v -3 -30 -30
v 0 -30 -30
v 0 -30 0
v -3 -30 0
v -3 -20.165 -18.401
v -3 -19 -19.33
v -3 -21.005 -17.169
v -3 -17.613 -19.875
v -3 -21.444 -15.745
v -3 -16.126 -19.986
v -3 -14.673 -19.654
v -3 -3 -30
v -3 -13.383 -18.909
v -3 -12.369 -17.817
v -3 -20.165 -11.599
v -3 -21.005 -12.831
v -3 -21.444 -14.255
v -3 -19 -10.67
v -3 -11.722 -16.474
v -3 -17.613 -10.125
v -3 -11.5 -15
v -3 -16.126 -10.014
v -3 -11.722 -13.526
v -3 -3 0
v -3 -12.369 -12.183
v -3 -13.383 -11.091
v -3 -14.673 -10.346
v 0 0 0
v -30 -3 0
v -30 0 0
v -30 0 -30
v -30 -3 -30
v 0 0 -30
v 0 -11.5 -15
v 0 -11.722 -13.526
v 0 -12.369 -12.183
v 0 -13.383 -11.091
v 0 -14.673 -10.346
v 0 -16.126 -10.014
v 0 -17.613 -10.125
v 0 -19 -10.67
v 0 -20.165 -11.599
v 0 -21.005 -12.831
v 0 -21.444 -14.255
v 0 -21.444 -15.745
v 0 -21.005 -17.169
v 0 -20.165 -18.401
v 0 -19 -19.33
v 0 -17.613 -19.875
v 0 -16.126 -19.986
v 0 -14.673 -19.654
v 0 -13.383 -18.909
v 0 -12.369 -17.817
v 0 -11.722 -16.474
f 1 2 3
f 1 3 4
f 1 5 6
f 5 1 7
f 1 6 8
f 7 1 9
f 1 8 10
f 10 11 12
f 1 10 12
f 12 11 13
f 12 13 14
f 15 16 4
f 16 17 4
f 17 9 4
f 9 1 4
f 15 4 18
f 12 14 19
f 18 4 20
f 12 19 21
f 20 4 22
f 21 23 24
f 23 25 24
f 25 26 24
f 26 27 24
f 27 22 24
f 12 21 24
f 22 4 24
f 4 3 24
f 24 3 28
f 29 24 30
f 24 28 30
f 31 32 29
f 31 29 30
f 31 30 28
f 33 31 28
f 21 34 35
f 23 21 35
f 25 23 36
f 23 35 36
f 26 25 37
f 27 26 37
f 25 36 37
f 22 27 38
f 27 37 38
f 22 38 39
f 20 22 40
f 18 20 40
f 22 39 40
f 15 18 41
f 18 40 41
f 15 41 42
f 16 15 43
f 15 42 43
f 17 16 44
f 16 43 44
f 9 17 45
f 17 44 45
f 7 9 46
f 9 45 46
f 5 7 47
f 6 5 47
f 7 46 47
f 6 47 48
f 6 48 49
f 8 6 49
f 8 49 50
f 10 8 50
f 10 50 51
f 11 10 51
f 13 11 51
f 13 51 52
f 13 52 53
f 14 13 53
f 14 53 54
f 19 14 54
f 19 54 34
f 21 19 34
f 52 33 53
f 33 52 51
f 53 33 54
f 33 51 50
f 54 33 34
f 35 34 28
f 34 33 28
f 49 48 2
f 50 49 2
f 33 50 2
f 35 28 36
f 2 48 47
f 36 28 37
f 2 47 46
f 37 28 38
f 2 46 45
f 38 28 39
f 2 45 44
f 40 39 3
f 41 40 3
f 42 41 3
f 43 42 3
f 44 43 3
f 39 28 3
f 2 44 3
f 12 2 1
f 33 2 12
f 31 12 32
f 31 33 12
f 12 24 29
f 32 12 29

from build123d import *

# Parameters (mm, degrees)
BOSS_EXTRU_1_DEPTH = 30
D_GAGEMENT_M81_D   = 10
D_GAGEMENT_M82_D   = 10
D_GAGEMENT_M83_D   = 10
D_GAGEMENT_M84_D   = 10


with BuildPart() as part:
    # Esquisse1 → Boss.-Extru.1 (new body)
    with BuildSketch(Plane.XY):
        Polygon((0, 0), (0, -30), (-3, -30), (-3, -3), (-30, -3), (-30, 0), align=None)
    extrude(amount=-BOSS_EXTRU_1_DEPTH)

    # Dégagement M81 (through all)
    with Locations(Plane(origin=(-3, -21, 985), x_dir=(0, -1, 0), z_dir=(-1, 0, 0))):
        with Locations((-4.5, 1000), (-4.5, -1000)):
            Hole(D_GAGEMENT_M81_D / 2)

    # Dégagement M82 (through all)
    with Locations(Plane(origin=(33, -21, -1015), x_dir=(0, -1, 0), z_dir=(1, 0, 0))):
        with Locations((-4.5, 1000), (-4.5, -1000)):
            Hole(D_GAGEMENT_M82_D / 2)

    # Dégagement M83 (through all)
    with Locations(Plane(origin=(33, -21, 985), x_dir=(0, -1, 0), z_dir=(1, 0, 0))):
        with Locations((-4.5, 1000), (-4.5, -1000)):
            Hole(D_GAGEMENT_M83_D / 2)

    # Dégagement M84 (through all)
    with Locations(Plane(origin=(-3, -21, -1015), x_dir=(0, -1, 0), z_dir=(-1, 0, 0))):
        with Locations((-4.5, 1000), (-4.5, -1000)):
            Hole(D_GAGEMENT_M84_D / 2)


solid = part.part
